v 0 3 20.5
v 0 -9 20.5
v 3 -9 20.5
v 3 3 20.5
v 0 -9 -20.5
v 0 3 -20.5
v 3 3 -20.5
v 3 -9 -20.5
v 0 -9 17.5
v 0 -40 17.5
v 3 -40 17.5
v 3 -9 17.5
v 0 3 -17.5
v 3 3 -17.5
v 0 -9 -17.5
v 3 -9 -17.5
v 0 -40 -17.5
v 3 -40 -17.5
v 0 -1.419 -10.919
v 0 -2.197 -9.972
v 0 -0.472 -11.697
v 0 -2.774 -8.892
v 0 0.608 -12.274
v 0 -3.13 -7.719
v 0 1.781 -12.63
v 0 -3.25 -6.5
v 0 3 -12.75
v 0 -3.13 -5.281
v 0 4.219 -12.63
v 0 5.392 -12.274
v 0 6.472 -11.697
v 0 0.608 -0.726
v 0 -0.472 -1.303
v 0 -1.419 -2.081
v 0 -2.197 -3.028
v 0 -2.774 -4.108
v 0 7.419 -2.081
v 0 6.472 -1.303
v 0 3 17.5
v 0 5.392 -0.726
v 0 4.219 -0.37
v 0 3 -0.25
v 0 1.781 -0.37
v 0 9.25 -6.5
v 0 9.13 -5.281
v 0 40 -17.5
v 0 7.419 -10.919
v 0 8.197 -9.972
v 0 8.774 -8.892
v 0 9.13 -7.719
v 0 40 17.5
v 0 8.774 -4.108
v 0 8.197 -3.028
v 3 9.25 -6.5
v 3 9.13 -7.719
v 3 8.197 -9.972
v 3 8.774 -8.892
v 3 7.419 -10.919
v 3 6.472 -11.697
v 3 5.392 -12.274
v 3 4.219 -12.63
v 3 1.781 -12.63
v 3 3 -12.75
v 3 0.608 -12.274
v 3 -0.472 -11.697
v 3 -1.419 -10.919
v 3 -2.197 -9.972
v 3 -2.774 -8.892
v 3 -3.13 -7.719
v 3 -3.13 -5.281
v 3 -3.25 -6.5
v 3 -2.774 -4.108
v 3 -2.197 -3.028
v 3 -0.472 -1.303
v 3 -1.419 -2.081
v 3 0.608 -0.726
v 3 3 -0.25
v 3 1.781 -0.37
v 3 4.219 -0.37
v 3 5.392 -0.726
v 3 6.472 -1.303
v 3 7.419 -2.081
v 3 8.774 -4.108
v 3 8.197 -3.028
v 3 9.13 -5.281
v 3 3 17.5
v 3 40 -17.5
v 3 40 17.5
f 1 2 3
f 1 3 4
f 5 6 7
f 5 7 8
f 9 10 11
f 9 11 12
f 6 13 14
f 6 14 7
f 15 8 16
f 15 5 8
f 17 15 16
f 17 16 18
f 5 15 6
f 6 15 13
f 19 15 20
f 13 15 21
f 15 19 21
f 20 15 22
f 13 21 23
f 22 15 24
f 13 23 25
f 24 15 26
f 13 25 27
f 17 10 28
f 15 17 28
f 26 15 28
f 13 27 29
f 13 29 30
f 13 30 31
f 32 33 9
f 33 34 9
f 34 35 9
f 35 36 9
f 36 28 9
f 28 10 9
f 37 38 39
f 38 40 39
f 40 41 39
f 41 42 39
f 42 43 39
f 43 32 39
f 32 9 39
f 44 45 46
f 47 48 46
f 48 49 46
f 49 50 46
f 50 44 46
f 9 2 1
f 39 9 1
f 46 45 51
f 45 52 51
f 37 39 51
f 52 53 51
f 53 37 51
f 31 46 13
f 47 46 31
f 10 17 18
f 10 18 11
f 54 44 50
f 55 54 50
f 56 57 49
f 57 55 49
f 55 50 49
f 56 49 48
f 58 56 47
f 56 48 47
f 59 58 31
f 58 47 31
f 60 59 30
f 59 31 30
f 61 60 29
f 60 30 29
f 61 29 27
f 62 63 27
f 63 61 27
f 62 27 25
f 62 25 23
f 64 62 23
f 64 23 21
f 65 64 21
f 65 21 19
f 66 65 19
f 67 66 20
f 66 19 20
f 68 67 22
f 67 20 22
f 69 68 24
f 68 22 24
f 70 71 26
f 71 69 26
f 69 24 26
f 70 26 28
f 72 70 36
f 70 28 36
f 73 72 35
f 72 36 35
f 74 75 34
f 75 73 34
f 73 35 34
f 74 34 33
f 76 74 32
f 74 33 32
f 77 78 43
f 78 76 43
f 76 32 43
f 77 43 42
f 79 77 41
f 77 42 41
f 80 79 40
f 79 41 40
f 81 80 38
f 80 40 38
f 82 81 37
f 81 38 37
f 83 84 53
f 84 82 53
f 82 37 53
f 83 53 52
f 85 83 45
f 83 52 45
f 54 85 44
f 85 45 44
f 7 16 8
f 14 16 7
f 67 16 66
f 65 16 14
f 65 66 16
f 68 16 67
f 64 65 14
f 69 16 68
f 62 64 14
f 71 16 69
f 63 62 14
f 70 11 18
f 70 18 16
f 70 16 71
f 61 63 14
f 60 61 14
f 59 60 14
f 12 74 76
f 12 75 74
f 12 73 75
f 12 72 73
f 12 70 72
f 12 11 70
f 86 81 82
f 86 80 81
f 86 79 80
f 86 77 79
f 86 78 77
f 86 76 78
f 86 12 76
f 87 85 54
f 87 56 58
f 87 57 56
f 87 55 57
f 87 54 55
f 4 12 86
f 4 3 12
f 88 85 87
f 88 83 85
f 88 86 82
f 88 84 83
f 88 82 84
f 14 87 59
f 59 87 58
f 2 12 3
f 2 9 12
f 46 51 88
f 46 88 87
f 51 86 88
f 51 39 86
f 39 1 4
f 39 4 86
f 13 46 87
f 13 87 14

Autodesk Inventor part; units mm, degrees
ref_plane "YZ Plane" through (0, 0, 0) normal (1, 0, 0) x (0, 1, 0)
ref_plane "XZ Plane" through (0, 0, 0) normal (0, 1, 0) x (-1, 0, 0)
ref_plane "XY Plane" through (0, 0, 0) normal (0, 0, 1) x (1, 0, 0)
sketch "Boceto1" plane through (0, 0, 0) normal (1, 0, 0) x (0, 1, 0)
  circle A0 centre (3, -6.5) radius 6.25
  line L0 (-9, 17.5) -> (-9, 20.5)
  line L1 (-9, 20.5) -> (3, 20.5)
  line L2 (3, 20.5) -> (3, 17.5)
  line L3 (3, 17.5) -> (40, 17.5)
  line L4 (40, 17.5) -> (40, -17.5)
  line L5 (40, -17.5) -> (3, -17.5)
  line L6 (3, -17.5) -> (3, -20.5)
  line L7 (3, -20.5) -> (-9, -20.5)
  line L8 (-9, -20.5) -> (-9, -17.5)
  line L9 (-9, -17.5) -> (-40, -17.5)
  line L10 (-40, -17.5) -> (-40, 17.5)
  line L11 (-40, 17.5) -> (-9, 17.5)
  point P0 (0, 0)
extrude "Extrusión1" add sketch "Boceto1" along normal blind 3
properties part number "Wheel_Support" material "MDF Tablero de fibras de densidad media"
